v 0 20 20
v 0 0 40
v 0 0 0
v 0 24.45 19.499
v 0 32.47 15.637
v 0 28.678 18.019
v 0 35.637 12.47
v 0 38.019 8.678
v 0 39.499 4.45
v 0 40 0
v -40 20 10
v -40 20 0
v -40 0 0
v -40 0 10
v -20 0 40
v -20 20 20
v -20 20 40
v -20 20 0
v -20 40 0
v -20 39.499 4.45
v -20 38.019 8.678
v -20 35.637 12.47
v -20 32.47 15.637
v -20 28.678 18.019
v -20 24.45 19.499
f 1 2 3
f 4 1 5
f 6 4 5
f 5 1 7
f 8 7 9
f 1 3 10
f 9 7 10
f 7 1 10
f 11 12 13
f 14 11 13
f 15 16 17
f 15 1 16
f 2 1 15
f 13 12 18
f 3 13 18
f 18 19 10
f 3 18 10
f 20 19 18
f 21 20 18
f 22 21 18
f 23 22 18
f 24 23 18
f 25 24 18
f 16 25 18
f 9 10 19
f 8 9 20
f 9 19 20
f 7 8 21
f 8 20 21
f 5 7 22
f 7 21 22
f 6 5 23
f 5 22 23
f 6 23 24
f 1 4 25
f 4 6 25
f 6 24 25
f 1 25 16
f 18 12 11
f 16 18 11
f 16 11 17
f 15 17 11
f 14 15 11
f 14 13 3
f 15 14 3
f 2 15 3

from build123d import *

# Parameters (mm, degrees)
BOSS_EXTRUDE1_DEPTH = 40
CUT_EXTRUDE1_DEPTH  = 40
CUT_EXTRUDE2_DEPTH  = 40
CUT_EXTRUDE4_DEPTH  = 20


with BuildPart() as part:
    # Sketch1 → Boss-Extrude1 (new body)
    with BuildSketch(Plane.XY):
        Polygon((0, 0), (0, 40), (-20, 40), (-20, 20), (-40, 20), (-40, 0), align=None)
    extrude(amount=BOSS_EXTRUDE1_DEPTH)

    # Sketch3 → Cut-Extrude1 (cut)
    with BuildSketch(Plane.ZY.offset(20)):
        with BuildLine():
            Line((40, 40), (0, 40))
            ThreePointArc((0, 40), (14.142135624, 34.142135624), (20, 20))
            Line((20, 20), (40, 20))
            Line((40, 20), (40, 40))
        make_face()
    extrude(amount=-CUT_EXTRUDE1_DEPTH, mode=Mode.SUBTRACT)

    # Sketch5 → Cut-Extrude2 (cut)
    with BuildSketch(Plane(origin=(0, 20, 0), x_dir=(1, 0, 0), z_dir=(0, 1, 0))):
        Polygon((-20, -40), (-40, -10), (-40, -40), align=None)
    extrude(amount=-CUT_EXTRUDE2_DEPTH, mode=Mode.SUBTRACT)

    # Sketch8 → Cut-Extrude4 (cut)
    with BuildSketch(Plane(origin=(0, 0, 0), x_dir=(0, 0, -1), z_dir=(1, 0, 0))):
        Polygon((-20, 20), (-40, 0), (-40, 20), align=None)
    extrude(amount=-CUT_EXTRUDE4_DEPTH, mode=Mode.SUBTRACT)


solid = part.part
